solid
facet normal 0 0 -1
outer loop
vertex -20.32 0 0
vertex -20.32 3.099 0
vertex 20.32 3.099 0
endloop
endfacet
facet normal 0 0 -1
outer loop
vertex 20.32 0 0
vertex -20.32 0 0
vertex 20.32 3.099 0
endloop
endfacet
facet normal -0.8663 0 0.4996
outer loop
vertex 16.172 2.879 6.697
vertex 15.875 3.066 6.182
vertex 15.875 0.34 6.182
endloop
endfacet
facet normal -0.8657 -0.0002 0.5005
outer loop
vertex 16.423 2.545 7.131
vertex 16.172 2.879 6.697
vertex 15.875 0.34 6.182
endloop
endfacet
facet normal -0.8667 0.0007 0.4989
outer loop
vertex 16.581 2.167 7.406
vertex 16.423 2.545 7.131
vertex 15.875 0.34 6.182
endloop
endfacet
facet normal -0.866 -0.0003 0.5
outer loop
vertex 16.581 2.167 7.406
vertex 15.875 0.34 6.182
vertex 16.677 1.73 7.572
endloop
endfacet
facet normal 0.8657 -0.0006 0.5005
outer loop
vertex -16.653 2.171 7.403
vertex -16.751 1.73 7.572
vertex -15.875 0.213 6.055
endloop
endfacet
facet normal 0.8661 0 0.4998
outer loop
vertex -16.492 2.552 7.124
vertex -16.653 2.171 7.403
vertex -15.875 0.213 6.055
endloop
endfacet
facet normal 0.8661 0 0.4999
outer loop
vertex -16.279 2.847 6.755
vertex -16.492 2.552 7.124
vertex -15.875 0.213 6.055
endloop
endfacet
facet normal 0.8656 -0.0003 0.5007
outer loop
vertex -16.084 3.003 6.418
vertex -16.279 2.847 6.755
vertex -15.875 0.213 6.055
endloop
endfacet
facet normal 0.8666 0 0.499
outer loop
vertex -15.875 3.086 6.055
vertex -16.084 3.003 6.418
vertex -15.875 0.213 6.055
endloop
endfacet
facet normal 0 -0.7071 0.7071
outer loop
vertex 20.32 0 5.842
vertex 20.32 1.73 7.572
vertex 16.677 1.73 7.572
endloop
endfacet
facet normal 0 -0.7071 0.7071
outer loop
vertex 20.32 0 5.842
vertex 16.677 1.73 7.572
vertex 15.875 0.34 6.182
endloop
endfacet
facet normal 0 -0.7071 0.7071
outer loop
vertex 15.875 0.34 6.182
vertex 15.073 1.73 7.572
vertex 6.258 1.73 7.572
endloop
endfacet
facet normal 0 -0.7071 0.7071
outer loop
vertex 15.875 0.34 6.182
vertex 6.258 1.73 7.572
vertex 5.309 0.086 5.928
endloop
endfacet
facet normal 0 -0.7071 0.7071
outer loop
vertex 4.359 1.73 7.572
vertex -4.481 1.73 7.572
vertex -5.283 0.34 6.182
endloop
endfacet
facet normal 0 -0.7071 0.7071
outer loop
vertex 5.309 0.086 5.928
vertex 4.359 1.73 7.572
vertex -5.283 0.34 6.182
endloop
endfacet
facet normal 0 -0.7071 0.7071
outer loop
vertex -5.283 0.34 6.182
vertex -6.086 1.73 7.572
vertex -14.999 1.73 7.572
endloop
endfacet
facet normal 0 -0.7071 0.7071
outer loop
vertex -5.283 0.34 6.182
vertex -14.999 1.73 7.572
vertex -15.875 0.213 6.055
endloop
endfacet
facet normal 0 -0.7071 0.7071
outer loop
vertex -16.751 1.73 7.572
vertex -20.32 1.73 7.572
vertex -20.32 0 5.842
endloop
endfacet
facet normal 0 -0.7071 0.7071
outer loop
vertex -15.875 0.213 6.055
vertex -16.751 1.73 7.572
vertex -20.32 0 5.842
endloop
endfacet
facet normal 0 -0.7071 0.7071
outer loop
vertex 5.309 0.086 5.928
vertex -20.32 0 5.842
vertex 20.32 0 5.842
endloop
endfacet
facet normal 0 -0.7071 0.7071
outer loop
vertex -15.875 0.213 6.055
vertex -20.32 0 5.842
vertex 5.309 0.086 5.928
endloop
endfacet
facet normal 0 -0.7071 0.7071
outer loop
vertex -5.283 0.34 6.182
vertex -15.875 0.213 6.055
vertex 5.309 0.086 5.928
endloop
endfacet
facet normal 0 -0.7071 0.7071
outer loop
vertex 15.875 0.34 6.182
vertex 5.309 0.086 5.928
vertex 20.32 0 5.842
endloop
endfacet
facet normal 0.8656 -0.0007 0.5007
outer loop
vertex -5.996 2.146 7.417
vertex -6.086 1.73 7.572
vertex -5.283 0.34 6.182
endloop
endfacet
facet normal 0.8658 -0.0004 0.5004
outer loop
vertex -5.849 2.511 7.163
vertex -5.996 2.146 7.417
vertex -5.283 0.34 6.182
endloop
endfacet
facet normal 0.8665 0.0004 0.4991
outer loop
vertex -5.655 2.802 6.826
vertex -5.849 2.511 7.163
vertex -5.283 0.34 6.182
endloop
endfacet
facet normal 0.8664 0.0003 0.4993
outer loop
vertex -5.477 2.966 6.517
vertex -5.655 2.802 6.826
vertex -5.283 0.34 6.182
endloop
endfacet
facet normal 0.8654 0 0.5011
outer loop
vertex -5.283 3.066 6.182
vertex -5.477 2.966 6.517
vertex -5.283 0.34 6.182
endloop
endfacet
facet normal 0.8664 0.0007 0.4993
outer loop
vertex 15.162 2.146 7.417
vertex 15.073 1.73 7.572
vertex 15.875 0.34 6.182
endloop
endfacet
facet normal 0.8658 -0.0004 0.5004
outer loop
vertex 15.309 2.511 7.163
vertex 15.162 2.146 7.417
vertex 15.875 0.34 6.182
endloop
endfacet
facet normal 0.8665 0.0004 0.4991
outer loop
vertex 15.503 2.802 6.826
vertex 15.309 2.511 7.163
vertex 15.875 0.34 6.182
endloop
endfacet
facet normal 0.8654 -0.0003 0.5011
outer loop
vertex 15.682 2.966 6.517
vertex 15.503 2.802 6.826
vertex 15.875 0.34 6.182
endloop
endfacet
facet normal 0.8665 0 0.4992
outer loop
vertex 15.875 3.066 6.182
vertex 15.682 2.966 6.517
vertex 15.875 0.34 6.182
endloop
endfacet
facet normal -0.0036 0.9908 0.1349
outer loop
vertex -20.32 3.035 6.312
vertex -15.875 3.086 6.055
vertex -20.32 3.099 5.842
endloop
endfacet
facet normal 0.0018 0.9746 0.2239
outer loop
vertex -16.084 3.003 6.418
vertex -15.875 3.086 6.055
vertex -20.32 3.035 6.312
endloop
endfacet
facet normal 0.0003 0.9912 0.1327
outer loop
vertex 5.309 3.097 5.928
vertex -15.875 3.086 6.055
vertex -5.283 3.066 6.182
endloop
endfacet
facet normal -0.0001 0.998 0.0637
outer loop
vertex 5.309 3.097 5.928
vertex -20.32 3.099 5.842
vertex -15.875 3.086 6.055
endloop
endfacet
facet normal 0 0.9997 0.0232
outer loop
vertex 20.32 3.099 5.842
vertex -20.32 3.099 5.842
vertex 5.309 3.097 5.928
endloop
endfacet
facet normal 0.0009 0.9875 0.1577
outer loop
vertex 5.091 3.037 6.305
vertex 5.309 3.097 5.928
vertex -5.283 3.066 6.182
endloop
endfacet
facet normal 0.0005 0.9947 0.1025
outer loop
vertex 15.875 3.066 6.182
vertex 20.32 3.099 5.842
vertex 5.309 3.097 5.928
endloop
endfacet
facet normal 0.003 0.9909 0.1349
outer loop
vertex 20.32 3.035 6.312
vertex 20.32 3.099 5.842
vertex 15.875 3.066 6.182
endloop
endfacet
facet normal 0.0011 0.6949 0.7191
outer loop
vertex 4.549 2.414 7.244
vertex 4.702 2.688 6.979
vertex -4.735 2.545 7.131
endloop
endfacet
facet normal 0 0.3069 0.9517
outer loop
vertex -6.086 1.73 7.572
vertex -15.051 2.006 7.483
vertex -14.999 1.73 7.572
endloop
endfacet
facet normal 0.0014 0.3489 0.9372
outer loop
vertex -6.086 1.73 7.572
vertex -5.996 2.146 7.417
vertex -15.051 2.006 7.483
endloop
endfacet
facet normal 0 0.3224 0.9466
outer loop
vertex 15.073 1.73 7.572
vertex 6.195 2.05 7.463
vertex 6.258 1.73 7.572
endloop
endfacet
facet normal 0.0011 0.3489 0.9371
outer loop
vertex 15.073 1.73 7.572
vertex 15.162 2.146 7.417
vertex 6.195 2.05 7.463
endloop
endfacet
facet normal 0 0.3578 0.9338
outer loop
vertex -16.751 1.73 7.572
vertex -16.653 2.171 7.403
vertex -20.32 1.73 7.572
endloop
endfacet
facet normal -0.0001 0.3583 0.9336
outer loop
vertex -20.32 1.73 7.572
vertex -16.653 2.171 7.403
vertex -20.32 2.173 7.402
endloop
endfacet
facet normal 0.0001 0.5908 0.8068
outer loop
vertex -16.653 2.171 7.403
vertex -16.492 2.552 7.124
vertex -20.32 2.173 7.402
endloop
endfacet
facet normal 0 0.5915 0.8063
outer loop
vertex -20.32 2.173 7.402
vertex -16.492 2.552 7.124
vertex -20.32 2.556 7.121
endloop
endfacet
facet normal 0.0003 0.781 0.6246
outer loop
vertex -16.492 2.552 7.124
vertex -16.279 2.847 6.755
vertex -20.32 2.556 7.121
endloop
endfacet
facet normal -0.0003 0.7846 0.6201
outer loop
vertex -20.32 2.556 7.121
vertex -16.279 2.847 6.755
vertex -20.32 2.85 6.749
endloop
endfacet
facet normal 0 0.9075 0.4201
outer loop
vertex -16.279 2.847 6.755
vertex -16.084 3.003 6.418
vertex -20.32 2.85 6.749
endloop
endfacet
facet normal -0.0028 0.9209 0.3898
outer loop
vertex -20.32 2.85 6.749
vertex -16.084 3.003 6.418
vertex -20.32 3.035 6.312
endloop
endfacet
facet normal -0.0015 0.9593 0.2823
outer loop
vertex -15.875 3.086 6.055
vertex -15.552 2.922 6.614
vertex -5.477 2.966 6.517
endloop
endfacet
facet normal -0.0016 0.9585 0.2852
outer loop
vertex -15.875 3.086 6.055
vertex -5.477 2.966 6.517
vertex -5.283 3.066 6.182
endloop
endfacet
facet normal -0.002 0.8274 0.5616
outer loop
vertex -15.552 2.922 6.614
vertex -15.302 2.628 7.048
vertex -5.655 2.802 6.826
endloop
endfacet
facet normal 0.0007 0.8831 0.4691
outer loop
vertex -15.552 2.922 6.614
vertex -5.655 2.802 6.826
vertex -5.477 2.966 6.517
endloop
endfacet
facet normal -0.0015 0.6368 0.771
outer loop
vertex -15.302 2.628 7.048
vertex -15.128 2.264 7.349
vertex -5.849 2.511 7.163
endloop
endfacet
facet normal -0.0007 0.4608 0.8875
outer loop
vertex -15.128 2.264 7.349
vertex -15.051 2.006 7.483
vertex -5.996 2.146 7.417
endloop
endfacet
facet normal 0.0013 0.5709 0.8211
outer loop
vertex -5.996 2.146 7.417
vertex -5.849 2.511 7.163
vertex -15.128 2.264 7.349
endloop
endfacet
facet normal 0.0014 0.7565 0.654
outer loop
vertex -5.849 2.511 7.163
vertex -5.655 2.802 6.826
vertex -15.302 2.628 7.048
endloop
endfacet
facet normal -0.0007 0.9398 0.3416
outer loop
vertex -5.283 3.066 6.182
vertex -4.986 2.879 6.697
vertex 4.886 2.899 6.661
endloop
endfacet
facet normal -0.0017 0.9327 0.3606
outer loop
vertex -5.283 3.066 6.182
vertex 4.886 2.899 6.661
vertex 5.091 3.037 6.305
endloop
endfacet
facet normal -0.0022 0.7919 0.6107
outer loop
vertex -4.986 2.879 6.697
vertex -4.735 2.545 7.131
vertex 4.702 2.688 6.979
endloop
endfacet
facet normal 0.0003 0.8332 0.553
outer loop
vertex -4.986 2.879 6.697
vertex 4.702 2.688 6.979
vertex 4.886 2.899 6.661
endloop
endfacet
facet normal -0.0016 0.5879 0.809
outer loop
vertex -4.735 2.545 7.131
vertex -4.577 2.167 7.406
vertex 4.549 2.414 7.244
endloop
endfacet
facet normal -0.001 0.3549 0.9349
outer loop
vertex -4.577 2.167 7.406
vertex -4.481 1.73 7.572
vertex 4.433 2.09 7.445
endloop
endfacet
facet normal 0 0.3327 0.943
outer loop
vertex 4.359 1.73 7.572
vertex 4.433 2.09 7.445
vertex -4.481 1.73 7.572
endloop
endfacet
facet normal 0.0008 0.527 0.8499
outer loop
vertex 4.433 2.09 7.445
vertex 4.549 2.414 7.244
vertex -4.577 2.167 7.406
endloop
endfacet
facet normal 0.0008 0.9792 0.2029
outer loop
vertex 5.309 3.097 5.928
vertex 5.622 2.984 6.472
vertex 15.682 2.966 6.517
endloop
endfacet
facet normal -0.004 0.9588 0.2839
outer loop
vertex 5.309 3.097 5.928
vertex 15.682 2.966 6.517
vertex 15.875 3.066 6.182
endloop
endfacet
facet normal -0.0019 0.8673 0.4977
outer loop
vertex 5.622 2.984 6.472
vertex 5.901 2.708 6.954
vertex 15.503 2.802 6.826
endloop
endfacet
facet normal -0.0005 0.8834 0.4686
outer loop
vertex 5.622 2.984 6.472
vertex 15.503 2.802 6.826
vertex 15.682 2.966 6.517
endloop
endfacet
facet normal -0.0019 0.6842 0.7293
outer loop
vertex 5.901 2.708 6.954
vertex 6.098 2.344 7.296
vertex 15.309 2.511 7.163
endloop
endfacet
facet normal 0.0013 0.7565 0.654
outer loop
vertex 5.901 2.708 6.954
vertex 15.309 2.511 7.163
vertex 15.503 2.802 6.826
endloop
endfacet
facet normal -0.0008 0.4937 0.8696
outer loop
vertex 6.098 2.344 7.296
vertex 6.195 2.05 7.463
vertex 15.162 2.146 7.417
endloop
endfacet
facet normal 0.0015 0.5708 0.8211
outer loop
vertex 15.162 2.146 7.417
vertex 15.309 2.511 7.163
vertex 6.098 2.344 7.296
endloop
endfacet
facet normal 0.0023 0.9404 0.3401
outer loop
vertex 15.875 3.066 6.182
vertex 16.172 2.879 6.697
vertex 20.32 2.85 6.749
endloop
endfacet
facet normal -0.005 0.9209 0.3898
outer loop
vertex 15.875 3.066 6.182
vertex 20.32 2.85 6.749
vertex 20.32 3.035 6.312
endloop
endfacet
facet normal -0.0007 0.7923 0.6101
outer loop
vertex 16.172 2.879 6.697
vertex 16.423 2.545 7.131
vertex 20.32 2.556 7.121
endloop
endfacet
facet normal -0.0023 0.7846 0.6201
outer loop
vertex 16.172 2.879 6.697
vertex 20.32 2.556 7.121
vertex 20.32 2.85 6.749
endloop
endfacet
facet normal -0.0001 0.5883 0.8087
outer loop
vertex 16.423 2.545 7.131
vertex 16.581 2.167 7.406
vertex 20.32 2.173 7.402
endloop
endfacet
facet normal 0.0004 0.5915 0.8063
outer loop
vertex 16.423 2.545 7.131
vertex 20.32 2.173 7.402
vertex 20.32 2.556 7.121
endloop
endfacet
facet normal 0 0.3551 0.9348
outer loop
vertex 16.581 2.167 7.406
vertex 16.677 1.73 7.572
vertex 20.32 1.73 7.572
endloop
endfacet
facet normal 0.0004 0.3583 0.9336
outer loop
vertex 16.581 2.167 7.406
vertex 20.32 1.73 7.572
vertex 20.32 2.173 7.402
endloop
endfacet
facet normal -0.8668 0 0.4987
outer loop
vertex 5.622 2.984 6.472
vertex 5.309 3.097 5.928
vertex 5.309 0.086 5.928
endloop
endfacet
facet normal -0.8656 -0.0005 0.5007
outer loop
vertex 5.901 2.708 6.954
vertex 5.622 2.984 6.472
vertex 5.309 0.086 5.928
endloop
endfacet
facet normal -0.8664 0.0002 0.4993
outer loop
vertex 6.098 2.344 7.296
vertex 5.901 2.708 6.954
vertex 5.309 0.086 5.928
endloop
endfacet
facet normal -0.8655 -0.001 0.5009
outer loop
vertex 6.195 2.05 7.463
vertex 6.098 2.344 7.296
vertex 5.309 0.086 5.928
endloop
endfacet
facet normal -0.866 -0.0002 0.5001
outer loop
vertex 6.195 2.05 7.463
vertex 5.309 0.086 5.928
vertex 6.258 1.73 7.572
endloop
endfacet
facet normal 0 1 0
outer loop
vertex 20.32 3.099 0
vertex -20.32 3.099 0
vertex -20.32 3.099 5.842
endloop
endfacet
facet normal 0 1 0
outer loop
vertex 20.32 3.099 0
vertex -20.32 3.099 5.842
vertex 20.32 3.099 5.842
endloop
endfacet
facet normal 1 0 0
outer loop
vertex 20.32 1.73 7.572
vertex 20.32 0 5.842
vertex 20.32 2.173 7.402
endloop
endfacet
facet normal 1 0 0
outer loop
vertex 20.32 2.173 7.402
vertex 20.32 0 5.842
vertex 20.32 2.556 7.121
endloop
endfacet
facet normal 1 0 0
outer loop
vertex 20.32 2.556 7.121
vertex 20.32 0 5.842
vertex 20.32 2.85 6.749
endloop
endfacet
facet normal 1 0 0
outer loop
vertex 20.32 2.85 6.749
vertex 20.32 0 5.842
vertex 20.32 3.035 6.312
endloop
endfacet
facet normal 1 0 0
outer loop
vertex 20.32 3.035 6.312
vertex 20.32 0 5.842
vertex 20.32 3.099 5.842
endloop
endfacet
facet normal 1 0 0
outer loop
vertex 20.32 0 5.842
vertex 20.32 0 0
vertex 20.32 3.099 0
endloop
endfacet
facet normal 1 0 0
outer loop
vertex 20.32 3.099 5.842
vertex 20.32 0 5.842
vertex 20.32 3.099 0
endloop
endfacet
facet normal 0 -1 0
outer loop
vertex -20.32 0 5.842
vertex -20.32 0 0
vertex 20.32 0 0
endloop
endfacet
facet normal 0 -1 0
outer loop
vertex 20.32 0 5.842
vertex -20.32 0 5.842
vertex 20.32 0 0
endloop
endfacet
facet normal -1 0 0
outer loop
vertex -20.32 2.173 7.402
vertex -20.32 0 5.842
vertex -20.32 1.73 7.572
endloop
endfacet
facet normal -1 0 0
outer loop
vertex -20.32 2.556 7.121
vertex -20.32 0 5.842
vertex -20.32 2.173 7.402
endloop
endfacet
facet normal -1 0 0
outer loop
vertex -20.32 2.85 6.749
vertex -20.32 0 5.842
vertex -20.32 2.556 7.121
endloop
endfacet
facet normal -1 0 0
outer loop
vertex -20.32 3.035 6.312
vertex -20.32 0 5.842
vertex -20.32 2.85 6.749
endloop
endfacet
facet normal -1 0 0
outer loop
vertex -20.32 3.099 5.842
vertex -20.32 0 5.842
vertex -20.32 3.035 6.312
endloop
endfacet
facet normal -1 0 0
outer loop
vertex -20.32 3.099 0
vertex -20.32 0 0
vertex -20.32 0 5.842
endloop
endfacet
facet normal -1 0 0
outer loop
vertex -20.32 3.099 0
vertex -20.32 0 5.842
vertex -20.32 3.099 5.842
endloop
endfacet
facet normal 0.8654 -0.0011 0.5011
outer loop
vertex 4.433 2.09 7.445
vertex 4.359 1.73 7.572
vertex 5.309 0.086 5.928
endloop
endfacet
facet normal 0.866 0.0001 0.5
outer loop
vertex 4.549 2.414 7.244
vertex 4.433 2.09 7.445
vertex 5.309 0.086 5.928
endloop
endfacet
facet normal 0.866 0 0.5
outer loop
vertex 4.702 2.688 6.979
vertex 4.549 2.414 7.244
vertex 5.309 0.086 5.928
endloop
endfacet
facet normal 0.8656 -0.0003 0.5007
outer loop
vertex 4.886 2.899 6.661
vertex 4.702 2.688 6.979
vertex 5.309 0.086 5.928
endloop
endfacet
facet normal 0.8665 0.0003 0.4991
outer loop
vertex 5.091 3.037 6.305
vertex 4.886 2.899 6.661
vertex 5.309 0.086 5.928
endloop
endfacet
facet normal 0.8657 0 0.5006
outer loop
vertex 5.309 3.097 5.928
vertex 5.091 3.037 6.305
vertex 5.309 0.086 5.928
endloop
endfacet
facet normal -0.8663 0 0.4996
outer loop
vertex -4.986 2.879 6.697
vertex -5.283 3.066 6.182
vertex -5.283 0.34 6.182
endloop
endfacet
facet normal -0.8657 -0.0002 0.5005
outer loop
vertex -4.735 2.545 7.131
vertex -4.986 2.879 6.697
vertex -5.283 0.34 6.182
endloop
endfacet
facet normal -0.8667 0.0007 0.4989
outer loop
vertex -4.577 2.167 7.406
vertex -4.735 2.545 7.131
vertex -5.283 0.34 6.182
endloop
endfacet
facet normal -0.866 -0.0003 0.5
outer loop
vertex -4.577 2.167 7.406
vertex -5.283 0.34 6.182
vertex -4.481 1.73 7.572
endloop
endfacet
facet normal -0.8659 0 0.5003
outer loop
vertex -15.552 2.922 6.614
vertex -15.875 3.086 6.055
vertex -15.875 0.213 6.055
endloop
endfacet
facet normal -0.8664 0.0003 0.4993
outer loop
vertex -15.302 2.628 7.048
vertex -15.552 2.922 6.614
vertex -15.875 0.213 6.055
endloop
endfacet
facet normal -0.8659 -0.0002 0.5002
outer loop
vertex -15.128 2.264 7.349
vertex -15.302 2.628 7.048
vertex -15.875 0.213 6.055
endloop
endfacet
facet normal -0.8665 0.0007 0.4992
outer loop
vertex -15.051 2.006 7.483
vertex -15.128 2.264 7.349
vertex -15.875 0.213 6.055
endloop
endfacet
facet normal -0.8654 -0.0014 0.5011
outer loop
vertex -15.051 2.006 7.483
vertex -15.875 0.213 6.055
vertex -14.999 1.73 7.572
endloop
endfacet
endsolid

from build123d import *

# Parameters (mm, degrees)
F0_W        = 40.64
F0_H        = 3.0988
F1_DEPTH    = 7.62
F3_R        = 1.778
F4_T1_DEPTH = 49.7849047052
F5_DEPTH    = 25.4


# Not quite as in the source:
# - a fillet or chamfer that OpenCascade refuses, or shapes differently, is made with other operations: its cross-section is extruded or revolved along the edge and cut away or added


with BuildPart() as f1:
    # F0 (on Top) → F1 (new body)
    with BuildSketch(Plane.XY):
        with Locations((0, 1.5494)):
            Rectangle(F0_W, F0_H)
    extrude(amount=F1_DEPTH)

    # F3
    f3_edges = [f1.edges().sort_by_distance(p)[0] for p in [
        (0, 3.0988, 7.62),
    ]]
    fillet(f3_edges, radius=F3_R)

    # F4: chamfer of 1.778 on 1 edges, made by hand

    # F4_s2 → F4_t1 (cut)
    with BuildSketch(Plane.YZ.offset(-24.8924523526)):
        Polygon((1.778, 7.62), (0, 5.842), (0, 7.62), align=None)
    extrude(amount=F4_T1_DEPTH, mode=Mode.SUBTRACT)

    # F2 (on face) → F5 (cut)
    with BuildSketch(Plane.XZ):
        Polygon((-15.875, 6.0552954744), (-14.9716174209, 7.62), (-16.7783825791, 7.62), align=None)
        Polygon((-4.4531409051, 7.62), (-6.1132590949, 7.62), (-5.2832, 6.1822954744), align=None)
        Polygon((6.2853060633, 7.62), (4.3318939367, 7.62), (5.3086, 5.9282954744), align=None)
        Polygon((16.7050590949, 7.62), (15.0449409051, 7.62), (15.875, 6.1822954744), align=None)
    extrude(amount=-F5_DEPTH, mode=Mode.SUBTRACT)


solid = f1.part
